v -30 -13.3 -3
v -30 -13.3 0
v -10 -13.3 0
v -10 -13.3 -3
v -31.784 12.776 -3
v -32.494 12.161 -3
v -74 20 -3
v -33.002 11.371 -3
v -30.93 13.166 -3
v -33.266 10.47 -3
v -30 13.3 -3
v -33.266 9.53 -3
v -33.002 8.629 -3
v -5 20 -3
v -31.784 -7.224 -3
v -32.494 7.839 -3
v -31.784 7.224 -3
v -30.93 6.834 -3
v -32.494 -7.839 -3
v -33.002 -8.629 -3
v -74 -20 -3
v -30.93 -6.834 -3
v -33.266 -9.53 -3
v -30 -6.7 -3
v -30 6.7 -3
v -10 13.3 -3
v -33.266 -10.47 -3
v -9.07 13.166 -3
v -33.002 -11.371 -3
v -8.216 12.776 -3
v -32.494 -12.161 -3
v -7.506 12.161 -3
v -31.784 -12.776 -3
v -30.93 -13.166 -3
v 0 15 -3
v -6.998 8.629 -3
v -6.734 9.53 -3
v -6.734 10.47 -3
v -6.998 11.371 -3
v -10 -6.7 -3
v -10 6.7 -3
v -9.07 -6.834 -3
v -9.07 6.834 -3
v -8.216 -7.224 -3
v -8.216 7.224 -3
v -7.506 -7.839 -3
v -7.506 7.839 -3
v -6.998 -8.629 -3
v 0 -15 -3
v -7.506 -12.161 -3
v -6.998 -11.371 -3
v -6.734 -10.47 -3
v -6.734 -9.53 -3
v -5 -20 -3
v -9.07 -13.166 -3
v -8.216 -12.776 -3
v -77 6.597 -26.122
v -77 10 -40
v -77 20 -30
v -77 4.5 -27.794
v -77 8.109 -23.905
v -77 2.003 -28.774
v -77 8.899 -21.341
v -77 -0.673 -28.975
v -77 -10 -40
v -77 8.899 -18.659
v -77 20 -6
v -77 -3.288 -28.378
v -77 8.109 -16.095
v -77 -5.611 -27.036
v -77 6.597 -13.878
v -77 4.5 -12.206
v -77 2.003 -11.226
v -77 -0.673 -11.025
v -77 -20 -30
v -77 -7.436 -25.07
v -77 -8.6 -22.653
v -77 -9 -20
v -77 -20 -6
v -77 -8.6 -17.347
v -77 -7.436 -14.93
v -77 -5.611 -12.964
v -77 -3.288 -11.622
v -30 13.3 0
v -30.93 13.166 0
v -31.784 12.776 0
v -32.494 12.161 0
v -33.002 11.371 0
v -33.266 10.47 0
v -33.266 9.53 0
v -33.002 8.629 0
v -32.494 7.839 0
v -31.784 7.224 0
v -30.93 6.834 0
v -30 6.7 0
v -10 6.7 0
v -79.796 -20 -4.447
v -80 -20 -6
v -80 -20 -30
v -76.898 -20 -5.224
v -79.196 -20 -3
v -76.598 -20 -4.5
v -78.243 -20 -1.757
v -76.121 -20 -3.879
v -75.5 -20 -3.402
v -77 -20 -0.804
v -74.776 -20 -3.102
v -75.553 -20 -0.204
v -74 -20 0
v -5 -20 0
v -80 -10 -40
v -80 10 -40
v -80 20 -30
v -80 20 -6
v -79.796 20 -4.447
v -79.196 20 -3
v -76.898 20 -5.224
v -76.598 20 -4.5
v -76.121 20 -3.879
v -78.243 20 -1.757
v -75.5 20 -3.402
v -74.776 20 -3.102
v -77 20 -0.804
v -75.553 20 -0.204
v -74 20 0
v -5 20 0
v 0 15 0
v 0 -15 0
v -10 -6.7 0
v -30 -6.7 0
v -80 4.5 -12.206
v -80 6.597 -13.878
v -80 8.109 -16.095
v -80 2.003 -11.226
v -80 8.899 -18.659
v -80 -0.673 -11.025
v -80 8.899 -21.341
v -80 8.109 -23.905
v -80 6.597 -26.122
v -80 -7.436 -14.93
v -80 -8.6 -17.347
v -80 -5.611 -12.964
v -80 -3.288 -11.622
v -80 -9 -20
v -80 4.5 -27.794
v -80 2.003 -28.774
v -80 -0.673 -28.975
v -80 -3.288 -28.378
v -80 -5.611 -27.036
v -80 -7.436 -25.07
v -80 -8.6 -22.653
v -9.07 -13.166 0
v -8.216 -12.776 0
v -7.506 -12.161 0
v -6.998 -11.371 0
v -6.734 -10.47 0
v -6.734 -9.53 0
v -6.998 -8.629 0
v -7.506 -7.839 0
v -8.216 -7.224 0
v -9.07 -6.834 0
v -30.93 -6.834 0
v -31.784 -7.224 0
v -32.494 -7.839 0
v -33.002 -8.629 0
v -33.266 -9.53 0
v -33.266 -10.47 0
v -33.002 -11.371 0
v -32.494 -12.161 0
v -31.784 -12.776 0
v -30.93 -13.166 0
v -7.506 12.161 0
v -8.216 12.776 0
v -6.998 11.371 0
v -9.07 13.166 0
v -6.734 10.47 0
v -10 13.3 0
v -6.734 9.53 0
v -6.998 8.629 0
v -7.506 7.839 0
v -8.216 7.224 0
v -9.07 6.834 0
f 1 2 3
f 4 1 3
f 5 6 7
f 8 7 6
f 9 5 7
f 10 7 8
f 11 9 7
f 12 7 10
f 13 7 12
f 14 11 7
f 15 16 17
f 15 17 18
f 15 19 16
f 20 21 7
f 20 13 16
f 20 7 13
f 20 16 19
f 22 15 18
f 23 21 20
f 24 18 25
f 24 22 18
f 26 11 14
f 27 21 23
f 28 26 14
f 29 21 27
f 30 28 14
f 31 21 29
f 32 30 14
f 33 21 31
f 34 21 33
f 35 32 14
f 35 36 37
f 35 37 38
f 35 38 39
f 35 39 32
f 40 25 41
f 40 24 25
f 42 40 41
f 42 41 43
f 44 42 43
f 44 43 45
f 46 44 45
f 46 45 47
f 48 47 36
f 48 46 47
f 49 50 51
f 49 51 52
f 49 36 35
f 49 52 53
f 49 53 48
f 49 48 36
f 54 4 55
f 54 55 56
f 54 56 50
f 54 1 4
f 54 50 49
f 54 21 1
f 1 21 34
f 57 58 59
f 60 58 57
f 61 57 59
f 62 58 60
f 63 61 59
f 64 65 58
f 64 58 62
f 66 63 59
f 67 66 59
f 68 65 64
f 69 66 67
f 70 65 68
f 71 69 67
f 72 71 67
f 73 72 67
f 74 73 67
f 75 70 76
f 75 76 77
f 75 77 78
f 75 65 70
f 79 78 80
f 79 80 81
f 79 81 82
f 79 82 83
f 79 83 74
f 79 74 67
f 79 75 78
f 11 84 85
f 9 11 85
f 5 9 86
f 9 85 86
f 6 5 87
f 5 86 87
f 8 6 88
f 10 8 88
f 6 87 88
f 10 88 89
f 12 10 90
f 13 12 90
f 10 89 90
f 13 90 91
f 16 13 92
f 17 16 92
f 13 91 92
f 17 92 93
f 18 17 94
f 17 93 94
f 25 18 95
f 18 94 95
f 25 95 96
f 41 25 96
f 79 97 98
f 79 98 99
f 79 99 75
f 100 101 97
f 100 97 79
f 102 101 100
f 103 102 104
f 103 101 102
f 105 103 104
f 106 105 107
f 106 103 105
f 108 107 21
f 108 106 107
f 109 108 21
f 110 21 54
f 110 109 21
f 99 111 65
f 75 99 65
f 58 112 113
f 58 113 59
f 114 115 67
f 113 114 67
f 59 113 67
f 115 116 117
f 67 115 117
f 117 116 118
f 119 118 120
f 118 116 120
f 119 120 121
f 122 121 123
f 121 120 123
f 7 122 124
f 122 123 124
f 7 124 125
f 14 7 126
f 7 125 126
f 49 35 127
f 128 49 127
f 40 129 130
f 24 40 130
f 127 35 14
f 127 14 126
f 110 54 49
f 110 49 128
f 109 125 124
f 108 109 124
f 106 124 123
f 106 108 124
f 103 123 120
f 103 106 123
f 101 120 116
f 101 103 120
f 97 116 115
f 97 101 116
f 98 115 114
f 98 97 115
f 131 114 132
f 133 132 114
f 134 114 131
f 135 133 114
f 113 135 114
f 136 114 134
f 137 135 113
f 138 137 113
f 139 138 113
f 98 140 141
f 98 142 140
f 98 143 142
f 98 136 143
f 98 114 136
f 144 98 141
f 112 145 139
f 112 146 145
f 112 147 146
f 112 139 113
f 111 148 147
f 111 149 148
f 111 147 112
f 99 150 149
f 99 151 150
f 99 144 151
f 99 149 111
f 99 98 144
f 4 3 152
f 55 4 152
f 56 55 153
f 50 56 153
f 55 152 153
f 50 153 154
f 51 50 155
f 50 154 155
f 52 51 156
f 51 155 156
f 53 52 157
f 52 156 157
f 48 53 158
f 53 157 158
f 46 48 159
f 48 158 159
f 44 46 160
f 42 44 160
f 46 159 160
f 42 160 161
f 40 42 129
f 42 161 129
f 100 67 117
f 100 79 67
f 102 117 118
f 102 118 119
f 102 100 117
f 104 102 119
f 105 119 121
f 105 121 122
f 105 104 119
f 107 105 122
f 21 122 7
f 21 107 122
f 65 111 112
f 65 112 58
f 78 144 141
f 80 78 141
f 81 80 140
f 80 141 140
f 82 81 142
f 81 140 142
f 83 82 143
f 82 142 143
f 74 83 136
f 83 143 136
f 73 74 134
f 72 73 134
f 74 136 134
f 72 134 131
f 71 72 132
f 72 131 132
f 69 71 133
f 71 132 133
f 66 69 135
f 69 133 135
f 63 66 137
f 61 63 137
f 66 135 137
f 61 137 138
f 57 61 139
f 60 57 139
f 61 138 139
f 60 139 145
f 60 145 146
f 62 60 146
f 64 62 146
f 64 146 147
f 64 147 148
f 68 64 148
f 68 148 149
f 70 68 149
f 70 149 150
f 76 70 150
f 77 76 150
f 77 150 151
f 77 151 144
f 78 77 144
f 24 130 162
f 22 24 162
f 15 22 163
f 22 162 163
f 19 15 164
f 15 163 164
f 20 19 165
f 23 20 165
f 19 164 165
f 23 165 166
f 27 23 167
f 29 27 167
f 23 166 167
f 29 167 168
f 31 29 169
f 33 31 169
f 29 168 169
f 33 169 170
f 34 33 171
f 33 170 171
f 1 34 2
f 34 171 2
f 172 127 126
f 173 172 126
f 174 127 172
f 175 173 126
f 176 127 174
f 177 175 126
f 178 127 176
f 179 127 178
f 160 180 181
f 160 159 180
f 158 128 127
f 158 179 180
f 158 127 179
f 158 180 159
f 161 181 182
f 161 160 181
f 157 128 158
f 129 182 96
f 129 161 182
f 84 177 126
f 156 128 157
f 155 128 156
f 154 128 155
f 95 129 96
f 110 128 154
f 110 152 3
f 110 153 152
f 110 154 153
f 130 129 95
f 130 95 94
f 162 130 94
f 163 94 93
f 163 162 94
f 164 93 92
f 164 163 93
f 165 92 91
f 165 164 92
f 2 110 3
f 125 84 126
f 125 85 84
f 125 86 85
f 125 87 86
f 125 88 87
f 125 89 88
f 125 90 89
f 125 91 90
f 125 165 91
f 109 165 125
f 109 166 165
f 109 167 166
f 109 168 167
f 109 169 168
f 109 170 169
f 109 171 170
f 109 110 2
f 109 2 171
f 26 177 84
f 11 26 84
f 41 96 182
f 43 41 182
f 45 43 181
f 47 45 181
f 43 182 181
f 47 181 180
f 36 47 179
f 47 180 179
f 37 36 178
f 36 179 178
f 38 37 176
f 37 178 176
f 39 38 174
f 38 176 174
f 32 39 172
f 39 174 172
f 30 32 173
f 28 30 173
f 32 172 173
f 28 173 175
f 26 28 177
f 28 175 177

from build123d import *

# Parameters (mm, degrees)
F1_DEPTH = 20
F2_R     = 9
F3_DEPTH = 4
F4_SIZE  = 10
F6_DEPTH = 3
F7_SIZE  = 5


with BuildPart() as f1:
    # F0 (on Front) → F1 (new body, symmetric)
    with BuildSketch(Plane.XZ):
        with BuildLine():
            Line((0, -3), (0, 0))
            Line((0, 0), (-74, 0))
            ThreePointArc((-74, 0), (-78.242641, -1.757359), (-80, -6))
            Line((-80, -6), (-80, -40))
            Line((-80, -40), (-77, -40))
            Line((-77, -40), (-77, -6))
            ThreePointArc((-77, -6), (-76.12132, -3.87868), (-74, -3))
            Line((-74, -3), (0, -3))
        make_face()
    extrude(amount=F1_DEPTH, both=True)

    # F2 (on face) → F3 (cut)
    with BuildSketch(Plane(origin=(-80, 0, 0), x_dir=(0, -1, 0), z_dir=(-1, 0, 0))):
        with Locations((0, -20)):
            Circle(F2_R)
    extrude(amount=-F3_DEPTH, mode=Mode.SUBTRACT)

    # F4
    f4_edges = [f1.edges().sort_by_distance(p)[0] for p in [
        (-78.5, -20, -40),
        (-78.5, 20, -40),
    ]]
    chamfer(f4_edges, length=F4_SIZE)

    # F5 (on face) → F6 (cut)
    with BuildSketch(Plane.XY):
        with BuildLine():
            Line((-10, -6.7), (-30, -6.7))
            ThreePointArc((-30, -6.7), (-33.3, -10), (-30, -13.3))
            Line((-30, -13.3), (-10, -13.3))
            ThreePointArc((-10, -13.3), (-6.7, -10), (-10, -6.7))
        make_face()
        with BuildLine():
            ThreePointArc((-30, 13.3), (-33.3, 10), (-30, 6.7))
            Line((-30, 6.7), (-10, 6.7))
            ThreePointArc((-10, 6.7), (-6.7, 10), (-10, 13.3))
            Line((-10, 13.3), (-30, 13.3))
        make_face()
    extrude(amount=-F6_DEPTH, mode=Mode.SUBTRACT)

    # F7
    f7_edges = [f1.edges().sort_by_distance(p)[0] for p in [
        (0, -20, -1.5),
        (0, 20, -1.5),
    ]]
    chamfer(f7_edges, length=F7_SIZE)


solid = f1.part
